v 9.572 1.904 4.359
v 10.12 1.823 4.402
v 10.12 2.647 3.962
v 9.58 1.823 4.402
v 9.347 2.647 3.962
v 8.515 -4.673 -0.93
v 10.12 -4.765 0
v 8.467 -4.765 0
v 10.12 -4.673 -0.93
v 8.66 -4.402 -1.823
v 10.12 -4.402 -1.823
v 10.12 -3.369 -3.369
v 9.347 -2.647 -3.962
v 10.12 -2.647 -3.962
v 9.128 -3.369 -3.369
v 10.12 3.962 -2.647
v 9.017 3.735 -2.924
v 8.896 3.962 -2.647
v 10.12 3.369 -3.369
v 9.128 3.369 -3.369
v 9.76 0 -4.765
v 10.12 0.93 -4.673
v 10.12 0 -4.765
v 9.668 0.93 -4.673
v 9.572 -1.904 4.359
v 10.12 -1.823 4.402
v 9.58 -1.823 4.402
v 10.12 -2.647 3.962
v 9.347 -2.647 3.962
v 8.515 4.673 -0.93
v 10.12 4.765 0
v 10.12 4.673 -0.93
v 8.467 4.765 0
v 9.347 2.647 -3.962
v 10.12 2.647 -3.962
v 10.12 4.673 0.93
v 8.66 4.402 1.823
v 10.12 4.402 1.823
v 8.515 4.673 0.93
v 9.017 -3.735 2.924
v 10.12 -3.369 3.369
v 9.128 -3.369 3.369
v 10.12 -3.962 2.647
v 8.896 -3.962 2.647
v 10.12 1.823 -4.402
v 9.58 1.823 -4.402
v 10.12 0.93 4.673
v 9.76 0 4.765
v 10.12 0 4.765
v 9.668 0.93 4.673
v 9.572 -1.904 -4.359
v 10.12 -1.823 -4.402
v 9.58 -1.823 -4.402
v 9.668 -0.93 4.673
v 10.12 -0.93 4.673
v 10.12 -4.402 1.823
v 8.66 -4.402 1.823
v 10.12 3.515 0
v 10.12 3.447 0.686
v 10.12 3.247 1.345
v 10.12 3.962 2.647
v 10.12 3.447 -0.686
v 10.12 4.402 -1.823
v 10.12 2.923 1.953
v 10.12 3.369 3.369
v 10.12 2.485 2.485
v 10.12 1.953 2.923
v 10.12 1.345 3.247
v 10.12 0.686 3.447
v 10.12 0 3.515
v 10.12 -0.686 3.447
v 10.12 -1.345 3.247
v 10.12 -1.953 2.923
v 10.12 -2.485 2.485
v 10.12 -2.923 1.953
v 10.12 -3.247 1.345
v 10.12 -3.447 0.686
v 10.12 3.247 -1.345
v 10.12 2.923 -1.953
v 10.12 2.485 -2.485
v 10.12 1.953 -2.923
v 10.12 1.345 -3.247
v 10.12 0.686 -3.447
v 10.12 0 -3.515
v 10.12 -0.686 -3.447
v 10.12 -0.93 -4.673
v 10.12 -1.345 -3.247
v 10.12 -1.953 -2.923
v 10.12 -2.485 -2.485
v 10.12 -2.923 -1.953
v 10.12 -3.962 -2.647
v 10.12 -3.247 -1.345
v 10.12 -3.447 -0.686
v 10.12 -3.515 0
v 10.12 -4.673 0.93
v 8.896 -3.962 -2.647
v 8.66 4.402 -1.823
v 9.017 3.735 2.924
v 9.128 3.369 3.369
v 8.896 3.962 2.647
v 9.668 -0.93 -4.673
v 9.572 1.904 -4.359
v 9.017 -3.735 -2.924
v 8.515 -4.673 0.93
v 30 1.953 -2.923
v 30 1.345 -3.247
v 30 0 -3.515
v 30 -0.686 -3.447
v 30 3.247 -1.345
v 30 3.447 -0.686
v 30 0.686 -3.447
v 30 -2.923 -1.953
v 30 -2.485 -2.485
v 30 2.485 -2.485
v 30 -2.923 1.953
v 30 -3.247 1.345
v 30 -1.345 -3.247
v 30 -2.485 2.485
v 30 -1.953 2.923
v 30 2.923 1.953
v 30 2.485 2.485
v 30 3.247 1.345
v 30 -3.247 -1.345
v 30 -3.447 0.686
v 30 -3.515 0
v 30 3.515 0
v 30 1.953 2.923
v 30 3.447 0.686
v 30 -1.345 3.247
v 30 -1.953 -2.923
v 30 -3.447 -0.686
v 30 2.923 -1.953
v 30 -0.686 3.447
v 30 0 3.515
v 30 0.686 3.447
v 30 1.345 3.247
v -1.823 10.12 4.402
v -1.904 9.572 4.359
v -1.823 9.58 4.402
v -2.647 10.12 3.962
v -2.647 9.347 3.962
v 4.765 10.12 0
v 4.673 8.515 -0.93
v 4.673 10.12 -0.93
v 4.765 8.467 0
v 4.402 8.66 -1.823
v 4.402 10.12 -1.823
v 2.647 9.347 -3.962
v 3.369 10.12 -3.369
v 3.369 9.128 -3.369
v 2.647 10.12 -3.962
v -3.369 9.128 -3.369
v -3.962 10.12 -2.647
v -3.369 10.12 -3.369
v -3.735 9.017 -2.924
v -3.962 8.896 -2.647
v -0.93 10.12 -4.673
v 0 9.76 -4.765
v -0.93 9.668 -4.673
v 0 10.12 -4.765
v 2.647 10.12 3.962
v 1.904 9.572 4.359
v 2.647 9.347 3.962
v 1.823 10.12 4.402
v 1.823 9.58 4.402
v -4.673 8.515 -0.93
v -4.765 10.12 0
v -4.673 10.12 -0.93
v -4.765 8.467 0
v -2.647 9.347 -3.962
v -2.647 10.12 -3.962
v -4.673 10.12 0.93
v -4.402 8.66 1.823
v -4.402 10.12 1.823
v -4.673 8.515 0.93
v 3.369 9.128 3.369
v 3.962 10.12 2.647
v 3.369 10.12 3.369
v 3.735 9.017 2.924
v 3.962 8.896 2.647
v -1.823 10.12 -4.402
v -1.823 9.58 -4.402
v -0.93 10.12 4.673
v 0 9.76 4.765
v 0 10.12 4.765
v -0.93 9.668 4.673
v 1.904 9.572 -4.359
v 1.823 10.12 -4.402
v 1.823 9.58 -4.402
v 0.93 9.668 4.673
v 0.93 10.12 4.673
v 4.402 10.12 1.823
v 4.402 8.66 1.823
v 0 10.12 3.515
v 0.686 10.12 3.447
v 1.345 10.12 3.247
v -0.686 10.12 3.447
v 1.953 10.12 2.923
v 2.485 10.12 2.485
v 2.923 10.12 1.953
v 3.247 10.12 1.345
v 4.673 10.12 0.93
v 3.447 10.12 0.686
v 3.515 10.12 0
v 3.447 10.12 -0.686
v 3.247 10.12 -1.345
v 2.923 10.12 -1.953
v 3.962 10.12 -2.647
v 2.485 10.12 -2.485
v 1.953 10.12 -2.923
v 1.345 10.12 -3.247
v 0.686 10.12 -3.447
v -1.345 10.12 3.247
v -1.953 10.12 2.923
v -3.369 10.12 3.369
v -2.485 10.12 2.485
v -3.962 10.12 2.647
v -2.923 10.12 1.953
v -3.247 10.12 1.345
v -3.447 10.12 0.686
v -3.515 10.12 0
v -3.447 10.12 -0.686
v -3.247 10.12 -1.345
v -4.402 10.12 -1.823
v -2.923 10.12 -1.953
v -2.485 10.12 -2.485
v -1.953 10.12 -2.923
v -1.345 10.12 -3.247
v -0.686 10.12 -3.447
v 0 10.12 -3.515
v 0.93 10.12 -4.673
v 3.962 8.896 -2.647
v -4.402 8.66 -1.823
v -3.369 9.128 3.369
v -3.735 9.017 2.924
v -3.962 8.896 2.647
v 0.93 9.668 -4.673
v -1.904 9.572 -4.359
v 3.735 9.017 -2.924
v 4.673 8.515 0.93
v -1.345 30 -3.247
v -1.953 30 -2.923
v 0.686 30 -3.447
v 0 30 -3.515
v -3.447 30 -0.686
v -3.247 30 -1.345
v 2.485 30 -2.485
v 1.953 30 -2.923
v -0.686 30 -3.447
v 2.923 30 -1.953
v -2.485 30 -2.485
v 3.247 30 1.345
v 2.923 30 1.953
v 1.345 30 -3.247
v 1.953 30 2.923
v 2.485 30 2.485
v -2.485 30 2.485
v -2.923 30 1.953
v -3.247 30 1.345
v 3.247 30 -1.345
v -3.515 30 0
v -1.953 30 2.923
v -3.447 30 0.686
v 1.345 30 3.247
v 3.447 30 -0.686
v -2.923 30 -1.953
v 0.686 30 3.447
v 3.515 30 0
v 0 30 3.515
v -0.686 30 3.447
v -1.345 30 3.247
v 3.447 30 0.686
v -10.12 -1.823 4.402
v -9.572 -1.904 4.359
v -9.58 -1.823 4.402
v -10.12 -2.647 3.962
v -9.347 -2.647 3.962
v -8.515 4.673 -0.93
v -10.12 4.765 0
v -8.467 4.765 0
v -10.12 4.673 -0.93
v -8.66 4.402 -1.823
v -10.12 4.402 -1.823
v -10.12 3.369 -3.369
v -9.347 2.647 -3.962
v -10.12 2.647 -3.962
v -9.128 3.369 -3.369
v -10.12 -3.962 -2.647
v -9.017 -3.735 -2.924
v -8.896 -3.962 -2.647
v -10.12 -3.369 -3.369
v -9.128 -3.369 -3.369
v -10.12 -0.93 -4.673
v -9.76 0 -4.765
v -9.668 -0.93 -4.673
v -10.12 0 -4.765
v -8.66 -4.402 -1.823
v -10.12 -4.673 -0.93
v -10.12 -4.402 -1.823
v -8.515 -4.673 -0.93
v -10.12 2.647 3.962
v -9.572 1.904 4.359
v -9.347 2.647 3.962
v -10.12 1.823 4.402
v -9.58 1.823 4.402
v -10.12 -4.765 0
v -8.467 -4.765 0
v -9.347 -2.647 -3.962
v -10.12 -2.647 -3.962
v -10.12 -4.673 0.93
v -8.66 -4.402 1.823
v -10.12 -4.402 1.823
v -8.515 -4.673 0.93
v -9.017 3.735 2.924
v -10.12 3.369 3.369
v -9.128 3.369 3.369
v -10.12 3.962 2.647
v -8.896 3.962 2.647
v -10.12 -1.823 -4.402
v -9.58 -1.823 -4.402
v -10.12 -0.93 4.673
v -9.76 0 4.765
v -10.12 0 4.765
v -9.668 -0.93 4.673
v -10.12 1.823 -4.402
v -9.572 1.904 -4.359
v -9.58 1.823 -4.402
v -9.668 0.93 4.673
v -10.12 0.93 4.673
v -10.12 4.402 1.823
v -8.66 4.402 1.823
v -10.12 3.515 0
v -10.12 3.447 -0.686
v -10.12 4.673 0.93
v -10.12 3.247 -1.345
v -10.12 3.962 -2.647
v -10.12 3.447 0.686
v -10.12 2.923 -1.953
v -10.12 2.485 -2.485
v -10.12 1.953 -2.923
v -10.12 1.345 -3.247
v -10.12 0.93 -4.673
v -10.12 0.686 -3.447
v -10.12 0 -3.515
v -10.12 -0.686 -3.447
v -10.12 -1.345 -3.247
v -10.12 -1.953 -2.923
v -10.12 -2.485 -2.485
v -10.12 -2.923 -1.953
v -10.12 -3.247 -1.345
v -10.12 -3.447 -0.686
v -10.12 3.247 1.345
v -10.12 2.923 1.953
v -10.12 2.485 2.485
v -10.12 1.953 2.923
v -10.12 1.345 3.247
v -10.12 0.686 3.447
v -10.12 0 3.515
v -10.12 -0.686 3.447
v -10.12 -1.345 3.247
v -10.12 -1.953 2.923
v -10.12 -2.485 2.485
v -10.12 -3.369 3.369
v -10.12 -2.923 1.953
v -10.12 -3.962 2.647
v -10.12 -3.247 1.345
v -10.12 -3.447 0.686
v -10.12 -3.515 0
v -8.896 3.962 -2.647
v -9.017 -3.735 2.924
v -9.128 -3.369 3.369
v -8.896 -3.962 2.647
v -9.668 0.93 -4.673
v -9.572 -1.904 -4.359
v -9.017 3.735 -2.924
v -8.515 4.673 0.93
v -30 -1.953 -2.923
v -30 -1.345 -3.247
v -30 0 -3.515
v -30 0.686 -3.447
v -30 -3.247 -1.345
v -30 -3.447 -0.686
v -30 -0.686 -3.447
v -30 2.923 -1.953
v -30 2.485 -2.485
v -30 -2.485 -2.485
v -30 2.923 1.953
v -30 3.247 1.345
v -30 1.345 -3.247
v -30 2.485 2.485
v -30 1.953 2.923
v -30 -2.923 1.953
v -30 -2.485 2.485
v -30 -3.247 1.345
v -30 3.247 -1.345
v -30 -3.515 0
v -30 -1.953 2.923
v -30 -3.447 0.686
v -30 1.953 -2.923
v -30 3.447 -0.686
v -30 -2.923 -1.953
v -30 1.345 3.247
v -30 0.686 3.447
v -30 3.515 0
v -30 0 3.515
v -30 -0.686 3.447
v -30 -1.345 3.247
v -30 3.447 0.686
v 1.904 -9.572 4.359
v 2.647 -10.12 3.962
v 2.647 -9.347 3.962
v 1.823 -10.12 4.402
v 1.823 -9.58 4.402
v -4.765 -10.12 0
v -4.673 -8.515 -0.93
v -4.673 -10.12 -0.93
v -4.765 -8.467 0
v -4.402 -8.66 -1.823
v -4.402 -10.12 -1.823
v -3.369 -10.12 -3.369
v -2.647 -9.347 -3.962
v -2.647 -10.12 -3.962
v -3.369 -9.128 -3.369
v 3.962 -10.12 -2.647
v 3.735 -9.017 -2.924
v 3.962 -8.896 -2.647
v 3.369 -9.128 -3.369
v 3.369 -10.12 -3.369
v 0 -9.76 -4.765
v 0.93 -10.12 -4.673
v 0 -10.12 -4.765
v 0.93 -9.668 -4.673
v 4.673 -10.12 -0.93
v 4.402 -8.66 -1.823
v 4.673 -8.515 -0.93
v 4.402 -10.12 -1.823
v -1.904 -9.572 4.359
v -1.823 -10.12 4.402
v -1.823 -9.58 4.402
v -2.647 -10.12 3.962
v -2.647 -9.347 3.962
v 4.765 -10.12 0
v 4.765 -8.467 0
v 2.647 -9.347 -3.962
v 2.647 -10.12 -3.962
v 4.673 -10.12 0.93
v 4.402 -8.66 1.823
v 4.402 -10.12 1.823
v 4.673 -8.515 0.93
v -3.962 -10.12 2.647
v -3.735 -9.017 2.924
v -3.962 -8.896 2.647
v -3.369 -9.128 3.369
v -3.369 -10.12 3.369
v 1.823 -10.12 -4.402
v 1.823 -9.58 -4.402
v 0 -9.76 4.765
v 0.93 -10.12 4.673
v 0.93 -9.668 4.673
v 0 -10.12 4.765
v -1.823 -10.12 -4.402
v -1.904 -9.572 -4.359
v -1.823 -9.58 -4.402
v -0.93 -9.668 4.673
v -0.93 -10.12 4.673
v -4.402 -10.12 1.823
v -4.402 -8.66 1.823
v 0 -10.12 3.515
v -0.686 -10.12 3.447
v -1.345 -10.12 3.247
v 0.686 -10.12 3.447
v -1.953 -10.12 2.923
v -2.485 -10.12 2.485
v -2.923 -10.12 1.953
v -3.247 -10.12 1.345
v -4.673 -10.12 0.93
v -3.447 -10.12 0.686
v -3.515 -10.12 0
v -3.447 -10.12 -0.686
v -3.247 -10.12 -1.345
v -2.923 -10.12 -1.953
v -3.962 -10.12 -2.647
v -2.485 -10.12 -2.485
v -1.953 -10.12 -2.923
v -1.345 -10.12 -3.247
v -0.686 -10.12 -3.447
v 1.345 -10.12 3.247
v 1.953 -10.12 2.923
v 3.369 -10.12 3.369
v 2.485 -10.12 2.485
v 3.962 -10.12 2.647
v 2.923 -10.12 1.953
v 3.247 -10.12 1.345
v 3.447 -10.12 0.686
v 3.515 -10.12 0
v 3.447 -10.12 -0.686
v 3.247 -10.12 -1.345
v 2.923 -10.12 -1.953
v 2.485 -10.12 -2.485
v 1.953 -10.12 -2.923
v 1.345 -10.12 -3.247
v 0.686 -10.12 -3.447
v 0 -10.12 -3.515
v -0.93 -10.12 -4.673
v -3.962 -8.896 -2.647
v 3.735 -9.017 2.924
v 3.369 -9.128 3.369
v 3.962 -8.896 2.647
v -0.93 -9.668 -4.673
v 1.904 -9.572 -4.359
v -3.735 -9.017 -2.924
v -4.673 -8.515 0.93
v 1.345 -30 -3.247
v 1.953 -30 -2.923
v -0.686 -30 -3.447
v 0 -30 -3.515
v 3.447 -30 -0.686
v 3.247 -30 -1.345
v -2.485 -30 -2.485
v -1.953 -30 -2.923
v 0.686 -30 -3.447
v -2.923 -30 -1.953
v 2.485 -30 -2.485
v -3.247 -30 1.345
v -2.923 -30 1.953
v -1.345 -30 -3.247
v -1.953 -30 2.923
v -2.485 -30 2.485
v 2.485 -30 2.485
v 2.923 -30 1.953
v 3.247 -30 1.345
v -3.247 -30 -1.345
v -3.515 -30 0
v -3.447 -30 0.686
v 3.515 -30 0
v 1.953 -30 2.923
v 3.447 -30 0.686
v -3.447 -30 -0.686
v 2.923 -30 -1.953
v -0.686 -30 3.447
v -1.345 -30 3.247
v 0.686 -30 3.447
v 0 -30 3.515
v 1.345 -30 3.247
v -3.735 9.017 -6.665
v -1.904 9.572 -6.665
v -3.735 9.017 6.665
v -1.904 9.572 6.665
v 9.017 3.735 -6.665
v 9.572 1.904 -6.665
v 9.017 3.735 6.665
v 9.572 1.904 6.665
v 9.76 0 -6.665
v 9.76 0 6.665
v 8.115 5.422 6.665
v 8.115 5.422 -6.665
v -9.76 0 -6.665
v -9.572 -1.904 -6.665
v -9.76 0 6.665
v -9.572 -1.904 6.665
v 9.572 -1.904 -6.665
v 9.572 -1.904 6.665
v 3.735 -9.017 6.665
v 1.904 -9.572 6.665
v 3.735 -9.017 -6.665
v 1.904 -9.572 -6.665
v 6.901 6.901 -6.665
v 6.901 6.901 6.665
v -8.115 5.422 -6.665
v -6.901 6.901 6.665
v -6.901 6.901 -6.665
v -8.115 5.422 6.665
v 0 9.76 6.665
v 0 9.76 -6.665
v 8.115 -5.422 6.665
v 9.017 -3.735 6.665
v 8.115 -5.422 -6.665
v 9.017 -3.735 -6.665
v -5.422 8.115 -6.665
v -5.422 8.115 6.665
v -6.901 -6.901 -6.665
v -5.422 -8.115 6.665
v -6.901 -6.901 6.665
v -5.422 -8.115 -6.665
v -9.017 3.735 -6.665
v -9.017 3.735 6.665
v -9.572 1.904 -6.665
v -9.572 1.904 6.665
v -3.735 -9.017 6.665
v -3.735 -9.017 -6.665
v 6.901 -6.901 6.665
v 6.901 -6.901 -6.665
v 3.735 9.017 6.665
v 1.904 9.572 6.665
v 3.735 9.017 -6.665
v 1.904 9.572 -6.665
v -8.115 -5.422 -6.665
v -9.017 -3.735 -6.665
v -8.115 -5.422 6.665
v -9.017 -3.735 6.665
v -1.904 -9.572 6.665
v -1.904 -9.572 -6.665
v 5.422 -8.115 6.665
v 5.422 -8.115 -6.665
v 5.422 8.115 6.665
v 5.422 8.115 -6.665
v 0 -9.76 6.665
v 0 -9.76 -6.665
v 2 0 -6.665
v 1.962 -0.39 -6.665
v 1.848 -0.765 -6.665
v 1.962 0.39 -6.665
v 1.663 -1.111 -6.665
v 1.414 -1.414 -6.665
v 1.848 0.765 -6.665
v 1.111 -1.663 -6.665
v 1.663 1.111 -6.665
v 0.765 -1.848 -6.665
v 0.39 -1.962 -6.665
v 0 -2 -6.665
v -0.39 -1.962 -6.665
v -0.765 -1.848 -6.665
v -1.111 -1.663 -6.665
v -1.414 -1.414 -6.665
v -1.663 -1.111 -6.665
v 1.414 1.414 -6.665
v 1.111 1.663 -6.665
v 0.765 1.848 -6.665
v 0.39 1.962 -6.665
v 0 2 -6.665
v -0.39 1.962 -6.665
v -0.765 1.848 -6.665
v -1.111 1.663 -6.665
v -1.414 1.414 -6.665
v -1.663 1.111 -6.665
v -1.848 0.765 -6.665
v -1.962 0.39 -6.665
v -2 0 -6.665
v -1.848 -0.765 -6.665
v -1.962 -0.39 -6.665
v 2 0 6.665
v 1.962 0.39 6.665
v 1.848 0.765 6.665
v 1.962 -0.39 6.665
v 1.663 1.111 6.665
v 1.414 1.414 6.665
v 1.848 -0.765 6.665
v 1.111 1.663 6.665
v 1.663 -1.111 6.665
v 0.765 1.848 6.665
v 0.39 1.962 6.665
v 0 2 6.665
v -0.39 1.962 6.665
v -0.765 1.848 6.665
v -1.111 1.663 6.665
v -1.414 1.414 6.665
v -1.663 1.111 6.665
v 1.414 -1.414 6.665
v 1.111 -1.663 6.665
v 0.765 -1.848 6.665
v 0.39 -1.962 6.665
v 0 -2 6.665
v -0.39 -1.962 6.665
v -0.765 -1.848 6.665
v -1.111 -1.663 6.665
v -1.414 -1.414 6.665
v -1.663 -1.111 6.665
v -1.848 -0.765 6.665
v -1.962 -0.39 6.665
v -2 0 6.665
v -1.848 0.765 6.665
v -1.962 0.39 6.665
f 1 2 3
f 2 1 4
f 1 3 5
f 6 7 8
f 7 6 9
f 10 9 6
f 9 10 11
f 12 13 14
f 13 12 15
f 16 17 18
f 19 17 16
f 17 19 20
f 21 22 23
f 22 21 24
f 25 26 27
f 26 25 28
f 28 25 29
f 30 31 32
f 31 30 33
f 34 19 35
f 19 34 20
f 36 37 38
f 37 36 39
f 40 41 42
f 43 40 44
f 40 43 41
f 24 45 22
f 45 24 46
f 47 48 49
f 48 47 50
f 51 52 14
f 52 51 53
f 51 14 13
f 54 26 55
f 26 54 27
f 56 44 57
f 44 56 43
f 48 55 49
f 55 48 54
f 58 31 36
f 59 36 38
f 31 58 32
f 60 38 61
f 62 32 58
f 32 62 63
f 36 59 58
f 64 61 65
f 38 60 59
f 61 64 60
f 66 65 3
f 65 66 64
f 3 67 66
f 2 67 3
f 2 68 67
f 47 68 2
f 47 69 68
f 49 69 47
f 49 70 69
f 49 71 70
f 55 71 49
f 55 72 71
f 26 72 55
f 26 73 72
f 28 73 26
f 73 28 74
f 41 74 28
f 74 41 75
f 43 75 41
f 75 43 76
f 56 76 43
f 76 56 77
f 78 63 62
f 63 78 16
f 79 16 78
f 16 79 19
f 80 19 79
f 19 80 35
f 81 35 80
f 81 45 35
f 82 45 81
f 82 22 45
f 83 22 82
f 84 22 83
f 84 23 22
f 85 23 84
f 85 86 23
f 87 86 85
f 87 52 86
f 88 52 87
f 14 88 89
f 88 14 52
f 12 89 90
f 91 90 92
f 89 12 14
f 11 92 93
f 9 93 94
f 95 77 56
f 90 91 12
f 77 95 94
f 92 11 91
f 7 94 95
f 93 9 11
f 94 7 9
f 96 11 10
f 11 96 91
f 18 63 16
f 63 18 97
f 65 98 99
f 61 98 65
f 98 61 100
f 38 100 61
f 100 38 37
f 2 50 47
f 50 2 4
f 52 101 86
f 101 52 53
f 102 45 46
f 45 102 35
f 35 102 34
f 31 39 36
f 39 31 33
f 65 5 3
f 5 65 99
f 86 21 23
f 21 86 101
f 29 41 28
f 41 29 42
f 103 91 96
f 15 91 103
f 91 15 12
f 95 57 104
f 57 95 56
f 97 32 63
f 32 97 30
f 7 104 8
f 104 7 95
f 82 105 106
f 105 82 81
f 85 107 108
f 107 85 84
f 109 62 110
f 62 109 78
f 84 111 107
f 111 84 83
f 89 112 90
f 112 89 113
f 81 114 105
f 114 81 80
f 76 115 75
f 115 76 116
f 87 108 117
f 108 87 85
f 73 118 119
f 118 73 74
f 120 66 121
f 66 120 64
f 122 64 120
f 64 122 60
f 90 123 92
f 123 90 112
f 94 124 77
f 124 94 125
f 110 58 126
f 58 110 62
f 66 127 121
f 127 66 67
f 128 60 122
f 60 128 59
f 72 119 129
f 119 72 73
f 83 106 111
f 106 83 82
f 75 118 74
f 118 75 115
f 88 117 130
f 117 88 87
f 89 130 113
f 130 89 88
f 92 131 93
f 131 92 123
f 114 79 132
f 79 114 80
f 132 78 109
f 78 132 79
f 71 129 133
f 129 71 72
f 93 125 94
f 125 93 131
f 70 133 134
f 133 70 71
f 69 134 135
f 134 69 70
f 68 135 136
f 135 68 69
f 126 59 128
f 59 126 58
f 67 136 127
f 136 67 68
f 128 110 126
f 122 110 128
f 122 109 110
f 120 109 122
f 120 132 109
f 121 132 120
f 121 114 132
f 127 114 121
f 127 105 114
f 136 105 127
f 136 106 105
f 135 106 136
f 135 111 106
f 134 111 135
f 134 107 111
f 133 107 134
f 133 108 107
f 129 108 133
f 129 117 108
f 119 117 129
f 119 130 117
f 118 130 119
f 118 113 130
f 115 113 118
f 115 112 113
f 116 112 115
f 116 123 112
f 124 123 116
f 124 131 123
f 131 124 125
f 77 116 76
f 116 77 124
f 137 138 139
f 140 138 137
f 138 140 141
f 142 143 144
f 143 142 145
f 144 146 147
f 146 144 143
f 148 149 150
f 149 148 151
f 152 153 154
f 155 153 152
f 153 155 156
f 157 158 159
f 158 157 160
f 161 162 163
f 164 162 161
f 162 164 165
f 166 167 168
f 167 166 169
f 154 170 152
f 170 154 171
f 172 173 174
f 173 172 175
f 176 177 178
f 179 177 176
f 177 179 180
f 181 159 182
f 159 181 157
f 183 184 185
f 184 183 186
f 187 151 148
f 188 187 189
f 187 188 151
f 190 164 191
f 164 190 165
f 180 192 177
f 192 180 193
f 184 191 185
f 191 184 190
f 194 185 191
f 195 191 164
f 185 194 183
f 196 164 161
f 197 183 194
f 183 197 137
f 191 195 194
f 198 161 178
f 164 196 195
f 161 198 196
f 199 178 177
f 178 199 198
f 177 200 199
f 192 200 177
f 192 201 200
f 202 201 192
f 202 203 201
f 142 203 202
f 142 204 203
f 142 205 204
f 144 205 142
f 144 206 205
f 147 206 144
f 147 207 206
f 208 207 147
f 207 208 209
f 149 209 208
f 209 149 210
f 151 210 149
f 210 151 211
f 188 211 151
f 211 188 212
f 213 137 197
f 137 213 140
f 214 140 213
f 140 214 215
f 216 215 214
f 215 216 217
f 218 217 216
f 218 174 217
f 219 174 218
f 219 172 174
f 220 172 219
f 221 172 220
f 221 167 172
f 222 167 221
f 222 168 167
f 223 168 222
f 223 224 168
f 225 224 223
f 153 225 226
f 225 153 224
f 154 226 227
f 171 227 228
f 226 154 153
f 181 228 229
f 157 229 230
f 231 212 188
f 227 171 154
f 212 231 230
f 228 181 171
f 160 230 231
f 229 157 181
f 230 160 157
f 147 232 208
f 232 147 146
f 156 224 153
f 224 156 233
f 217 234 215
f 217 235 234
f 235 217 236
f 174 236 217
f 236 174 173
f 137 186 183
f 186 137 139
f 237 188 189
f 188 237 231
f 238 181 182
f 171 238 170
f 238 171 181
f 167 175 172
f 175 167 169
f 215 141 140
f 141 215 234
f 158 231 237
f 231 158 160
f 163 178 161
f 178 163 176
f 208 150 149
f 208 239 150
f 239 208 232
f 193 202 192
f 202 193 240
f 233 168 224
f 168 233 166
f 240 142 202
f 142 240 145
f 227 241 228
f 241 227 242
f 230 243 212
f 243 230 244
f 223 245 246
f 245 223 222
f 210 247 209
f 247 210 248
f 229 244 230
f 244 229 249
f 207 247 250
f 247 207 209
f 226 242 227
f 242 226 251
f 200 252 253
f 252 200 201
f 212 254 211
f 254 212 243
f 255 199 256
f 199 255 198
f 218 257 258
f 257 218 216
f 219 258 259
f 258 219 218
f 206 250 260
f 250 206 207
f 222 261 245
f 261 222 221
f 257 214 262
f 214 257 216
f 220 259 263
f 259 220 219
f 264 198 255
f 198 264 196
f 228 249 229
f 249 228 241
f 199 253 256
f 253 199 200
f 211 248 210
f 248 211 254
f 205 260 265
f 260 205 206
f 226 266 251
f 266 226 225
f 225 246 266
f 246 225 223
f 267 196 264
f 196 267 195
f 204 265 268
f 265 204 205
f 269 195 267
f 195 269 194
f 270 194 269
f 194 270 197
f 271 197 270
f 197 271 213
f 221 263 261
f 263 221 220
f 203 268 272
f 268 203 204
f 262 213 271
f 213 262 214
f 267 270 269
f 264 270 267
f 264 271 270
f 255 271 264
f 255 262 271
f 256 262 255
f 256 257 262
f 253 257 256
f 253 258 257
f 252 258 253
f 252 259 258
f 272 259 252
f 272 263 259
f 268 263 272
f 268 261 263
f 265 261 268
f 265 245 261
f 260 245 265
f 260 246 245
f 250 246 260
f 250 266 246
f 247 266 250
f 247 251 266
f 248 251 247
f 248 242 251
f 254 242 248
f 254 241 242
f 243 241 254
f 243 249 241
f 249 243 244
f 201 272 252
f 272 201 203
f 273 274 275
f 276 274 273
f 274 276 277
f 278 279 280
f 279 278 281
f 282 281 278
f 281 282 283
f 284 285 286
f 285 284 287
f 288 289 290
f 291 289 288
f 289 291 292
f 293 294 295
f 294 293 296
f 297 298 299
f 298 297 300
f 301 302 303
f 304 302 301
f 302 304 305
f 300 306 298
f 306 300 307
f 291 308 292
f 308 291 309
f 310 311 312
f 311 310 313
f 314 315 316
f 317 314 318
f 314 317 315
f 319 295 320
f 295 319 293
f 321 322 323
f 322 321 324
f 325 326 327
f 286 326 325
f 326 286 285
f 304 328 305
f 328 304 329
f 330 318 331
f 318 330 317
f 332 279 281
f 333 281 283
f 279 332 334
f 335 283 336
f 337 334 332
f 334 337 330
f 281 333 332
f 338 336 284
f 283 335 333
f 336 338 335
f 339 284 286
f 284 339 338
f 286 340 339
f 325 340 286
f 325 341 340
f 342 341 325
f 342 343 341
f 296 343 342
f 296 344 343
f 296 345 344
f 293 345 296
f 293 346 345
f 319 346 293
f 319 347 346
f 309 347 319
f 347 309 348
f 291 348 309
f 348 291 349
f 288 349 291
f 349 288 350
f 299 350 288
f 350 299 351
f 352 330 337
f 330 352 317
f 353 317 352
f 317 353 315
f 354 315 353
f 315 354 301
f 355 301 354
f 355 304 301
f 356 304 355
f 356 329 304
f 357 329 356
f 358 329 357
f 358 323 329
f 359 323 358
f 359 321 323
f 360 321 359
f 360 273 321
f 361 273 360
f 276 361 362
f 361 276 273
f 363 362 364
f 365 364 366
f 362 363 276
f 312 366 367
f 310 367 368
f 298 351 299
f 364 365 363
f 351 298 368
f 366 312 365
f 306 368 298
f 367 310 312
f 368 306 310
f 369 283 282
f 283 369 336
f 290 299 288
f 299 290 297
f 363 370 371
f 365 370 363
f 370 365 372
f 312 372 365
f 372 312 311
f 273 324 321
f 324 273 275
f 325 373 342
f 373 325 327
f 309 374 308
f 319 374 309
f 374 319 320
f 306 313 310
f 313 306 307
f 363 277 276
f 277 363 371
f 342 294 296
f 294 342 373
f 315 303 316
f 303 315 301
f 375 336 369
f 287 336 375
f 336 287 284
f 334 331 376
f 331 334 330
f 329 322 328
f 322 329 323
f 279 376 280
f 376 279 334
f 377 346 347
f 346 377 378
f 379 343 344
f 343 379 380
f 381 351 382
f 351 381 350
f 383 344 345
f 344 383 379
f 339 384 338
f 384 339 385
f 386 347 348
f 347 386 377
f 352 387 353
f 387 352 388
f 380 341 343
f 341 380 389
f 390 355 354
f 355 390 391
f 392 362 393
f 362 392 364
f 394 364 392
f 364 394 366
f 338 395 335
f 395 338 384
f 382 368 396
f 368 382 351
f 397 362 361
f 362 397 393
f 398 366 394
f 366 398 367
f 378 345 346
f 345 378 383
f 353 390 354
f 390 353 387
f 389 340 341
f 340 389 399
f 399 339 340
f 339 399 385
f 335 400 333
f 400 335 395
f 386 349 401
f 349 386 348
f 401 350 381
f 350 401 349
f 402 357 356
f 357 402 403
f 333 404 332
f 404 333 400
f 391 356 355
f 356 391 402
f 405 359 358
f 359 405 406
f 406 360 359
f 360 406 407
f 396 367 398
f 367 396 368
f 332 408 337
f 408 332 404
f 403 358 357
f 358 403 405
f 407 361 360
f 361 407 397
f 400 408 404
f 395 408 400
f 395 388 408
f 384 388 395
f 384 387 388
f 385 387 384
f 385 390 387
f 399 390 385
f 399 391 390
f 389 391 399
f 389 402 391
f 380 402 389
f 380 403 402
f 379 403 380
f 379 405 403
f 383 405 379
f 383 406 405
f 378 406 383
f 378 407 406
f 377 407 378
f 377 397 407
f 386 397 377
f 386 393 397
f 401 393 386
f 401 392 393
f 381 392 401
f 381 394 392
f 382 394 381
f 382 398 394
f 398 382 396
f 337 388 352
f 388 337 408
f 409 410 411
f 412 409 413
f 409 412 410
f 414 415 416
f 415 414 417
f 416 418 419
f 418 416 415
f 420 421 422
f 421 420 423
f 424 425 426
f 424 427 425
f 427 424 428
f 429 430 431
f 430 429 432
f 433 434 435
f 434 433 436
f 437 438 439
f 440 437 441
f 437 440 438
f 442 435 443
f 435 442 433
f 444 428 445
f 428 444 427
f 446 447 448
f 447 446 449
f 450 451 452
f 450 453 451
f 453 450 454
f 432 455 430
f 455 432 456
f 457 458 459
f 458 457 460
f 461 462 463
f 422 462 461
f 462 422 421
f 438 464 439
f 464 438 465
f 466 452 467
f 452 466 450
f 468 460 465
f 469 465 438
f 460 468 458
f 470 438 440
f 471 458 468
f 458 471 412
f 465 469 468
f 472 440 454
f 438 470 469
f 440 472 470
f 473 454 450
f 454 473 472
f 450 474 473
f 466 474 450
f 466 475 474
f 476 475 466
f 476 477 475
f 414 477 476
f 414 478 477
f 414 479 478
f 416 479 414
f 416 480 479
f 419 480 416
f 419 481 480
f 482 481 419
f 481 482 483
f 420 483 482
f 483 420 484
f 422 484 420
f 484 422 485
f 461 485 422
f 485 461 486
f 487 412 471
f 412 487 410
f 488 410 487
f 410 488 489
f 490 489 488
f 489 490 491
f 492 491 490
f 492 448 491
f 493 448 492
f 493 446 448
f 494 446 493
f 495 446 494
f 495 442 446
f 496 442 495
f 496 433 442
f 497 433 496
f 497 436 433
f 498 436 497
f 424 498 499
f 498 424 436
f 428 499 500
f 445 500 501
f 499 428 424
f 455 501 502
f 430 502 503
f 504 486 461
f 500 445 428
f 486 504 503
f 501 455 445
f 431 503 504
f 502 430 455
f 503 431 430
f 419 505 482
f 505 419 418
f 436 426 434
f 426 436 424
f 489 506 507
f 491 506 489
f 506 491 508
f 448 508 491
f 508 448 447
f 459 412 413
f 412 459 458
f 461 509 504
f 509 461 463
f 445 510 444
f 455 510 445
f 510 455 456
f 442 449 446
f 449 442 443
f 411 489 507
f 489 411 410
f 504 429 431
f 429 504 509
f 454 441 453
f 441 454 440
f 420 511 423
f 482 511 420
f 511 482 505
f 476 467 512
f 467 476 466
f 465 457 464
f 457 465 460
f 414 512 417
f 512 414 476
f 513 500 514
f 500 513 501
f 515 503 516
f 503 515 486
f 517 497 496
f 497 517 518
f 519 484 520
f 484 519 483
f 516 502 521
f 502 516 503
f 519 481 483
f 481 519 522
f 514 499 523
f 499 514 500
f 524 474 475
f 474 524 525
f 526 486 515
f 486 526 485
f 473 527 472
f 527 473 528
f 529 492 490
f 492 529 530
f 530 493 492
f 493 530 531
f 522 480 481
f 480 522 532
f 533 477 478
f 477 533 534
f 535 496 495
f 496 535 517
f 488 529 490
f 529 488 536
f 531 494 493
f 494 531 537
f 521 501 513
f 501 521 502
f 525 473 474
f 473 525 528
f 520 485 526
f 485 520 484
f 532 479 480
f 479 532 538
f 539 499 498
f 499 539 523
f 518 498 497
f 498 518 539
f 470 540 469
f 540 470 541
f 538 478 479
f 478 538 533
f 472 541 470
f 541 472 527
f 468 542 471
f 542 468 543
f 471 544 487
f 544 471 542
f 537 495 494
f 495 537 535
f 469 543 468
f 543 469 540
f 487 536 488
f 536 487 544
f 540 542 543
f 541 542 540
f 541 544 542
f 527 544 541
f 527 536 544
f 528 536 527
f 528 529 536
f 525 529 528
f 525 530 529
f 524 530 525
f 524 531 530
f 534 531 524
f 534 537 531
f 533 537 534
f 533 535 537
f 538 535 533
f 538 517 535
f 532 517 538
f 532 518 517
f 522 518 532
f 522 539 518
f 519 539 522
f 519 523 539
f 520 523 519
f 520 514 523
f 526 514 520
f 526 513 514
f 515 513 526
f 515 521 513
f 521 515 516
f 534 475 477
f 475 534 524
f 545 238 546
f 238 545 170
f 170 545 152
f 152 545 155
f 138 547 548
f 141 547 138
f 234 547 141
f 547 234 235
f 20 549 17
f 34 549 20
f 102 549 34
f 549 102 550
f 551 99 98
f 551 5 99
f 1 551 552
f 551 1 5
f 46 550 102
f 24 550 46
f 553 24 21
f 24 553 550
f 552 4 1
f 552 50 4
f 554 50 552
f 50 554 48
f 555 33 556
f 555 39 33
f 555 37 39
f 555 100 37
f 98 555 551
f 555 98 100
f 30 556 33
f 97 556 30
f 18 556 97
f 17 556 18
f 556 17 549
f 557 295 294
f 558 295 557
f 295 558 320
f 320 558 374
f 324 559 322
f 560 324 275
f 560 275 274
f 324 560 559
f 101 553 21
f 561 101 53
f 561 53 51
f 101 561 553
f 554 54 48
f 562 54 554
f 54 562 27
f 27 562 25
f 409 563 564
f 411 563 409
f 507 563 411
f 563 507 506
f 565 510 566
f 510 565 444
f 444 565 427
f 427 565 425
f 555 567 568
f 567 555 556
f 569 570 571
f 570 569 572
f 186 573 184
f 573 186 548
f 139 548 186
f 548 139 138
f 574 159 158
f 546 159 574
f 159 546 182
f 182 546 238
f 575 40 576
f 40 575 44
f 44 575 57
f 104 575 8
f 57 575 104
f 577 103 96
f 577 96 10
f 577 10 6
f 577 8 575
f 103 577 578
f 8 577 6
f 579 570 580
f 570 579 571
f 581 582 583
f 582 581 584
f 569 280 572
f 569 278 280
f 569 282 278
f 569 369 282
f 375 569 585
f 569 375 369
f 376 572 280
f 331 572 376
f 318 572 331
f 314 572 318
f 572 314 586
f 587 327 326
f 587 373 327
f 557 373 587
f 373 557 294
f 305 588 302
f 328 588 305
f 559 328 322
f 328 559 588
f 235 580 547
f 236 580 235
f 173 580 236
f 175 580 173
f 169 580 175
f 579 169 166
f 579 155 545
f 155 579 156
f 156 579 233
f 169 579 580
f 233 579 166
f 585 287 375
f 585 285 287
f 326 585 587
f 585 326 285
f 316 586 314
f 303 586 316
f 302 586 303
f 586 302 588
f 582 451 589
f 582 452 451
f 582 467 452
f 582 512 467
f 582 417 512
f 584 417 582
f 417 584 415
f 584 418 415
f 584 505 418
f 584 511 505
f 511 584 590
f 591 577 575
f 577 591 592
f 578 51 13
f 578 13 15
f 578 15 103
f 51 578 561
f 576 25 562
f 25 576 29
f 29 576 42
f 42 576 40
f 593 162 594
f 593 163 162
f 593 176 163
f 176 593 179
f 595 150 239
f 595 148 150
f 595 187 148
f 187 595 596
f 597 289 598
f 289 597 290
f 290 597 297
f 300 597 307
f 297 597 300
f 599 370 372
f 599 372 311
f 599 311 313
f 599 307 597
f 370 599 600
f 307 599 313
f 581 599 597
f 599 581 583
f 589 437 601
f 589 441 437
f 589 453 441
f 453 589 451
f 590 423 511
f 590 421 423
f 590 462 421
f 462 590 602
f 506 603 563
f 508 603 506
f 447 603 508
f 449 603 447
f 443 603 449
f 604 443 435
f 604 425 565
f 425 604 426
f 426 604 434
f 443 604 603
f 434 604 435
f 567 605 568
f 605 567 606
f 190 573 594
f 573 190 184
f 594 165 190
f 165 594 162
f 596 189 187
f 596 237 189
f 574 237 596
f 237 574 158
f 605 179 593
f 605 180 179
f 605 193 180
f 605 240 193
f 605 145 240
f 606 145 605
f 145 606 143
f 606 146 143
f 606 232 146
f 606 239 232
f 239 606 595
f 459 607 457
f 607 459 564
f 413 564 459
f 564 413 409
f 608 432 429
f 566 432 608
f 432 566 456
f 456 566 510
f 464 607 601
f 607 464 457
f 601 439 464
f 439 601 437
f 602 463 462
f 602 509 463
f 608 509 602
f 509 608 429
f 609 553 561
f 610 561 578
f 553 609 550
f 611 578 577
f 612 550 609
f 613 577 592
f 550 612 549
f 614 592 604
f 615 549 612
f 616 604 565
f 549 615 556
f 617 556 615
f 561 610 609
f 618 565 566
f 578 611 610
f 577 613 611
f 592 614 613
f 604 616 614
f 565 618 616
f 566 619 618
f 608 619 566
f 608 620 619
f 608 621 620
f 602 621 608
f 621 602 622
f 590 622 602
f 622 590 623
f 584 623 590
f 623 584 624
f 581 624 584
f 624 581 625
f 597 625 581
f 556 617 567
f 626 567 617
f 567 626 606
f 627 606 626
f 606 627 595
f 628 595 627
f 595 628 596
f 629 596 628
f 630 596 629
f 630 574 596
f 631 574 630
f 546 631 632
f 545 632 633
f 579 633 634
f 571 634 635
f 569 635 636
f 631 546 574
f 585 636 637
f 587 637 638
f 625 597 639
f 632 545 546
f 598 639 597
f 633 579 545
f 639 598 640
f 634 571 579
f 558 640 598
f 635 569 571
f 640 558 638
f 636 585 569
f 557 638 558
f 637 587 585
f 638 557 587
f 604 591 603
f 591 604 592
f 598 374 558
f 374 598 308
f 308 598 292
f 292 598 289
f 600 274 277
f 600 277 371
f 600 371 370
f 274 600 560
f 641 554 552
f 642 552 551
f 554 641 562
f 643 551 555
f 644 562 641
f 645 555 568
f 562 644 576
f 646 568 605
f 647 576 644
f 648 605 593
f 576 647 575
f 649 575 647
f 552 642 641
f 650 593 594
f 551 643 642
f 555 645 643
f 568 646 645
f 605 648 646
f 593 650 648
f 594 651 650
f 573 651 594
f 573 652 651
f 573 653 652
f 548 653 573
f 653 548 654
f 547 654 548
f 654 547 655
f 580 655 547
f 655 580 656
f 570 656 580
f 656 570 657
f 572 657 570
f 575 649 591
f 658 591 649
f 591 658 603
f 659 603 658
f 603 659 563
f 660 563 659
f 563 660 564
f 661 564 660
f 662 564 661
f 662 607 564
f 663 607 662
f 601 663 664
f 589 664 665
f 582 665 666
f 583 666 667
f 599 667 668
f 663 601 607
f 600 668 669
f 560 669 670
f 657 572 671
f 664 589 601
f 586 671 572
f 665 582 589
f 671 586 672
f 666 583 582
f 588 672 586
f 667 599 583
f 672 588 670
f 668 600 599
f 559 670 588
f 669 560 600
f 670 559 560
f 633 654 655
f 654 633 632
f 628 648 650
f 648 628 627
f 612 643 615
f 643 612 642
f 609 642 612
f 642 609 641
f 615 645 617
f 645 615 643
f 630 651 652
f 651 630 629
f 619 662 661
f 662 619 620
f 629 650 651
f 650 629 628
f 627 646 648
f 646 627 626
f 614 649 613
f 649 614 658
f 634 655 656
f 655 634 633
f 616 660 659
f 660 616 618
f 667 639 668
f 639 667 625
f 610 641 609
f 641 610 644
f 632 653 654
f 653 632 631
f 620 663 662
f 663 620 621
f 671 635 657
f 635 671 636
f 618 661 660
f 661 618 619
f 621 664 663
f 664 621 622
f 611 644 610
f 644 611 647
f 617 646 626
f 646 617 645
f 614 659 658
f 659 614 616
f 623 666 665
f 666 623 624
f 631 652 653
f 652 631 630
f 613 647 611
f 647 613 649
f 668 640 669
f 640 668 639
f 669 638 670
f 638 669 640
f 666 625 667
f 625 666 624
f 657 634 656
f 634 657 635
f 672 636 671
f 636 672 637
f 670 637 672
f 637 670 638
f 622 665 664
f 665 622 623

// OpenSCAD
$fn = 32;

// ----------------------------------------------------------------------
// Cardan cross: 60 mm span, 9.53 mm trunnions
// ----------------------------------------------------------------------

// --- parameters (mm) ---
journal_d = 9.53;         // trunnion diameter
arm_len = 30;             // trunnion length from the centre
step_r = 3.24;            // step position from the centre
step_d = 7.03;            // journal diameter after the step
hub_d = 19.52;            // hub diameter
hub_h = 13.33;            // hub height
bore_d = 4;               // hub bore

difference() {
  union() {
    /* hub along the joint axis */
    cylinder(h = hub_h, d = hub_d, center = true);
    for (a = [0 : 90 : 270]) rotate([0, 0, a]) {
      /* trunnion, sunk into the hub */
      translate([hub_d / 4, 0, 0]) rotate([0, 90, 0]) cylinder(h = step_r + 2, d = journal_d);
      /* stepped journal out to the tip */
      translate([step_r - 0.5, 0, 0]) rotate([0, 90, 0]) cylinder(h = arm_len + 0.5 - step_r, d = step_d);
    }
  }
  /* lubrication bore through the hub, 2.5 mm clear on both sides */
  translate([0, 0, -hub_h / 2 - 2.5]) cylinder(h = hub_h + 5, d = bore_d);
}
